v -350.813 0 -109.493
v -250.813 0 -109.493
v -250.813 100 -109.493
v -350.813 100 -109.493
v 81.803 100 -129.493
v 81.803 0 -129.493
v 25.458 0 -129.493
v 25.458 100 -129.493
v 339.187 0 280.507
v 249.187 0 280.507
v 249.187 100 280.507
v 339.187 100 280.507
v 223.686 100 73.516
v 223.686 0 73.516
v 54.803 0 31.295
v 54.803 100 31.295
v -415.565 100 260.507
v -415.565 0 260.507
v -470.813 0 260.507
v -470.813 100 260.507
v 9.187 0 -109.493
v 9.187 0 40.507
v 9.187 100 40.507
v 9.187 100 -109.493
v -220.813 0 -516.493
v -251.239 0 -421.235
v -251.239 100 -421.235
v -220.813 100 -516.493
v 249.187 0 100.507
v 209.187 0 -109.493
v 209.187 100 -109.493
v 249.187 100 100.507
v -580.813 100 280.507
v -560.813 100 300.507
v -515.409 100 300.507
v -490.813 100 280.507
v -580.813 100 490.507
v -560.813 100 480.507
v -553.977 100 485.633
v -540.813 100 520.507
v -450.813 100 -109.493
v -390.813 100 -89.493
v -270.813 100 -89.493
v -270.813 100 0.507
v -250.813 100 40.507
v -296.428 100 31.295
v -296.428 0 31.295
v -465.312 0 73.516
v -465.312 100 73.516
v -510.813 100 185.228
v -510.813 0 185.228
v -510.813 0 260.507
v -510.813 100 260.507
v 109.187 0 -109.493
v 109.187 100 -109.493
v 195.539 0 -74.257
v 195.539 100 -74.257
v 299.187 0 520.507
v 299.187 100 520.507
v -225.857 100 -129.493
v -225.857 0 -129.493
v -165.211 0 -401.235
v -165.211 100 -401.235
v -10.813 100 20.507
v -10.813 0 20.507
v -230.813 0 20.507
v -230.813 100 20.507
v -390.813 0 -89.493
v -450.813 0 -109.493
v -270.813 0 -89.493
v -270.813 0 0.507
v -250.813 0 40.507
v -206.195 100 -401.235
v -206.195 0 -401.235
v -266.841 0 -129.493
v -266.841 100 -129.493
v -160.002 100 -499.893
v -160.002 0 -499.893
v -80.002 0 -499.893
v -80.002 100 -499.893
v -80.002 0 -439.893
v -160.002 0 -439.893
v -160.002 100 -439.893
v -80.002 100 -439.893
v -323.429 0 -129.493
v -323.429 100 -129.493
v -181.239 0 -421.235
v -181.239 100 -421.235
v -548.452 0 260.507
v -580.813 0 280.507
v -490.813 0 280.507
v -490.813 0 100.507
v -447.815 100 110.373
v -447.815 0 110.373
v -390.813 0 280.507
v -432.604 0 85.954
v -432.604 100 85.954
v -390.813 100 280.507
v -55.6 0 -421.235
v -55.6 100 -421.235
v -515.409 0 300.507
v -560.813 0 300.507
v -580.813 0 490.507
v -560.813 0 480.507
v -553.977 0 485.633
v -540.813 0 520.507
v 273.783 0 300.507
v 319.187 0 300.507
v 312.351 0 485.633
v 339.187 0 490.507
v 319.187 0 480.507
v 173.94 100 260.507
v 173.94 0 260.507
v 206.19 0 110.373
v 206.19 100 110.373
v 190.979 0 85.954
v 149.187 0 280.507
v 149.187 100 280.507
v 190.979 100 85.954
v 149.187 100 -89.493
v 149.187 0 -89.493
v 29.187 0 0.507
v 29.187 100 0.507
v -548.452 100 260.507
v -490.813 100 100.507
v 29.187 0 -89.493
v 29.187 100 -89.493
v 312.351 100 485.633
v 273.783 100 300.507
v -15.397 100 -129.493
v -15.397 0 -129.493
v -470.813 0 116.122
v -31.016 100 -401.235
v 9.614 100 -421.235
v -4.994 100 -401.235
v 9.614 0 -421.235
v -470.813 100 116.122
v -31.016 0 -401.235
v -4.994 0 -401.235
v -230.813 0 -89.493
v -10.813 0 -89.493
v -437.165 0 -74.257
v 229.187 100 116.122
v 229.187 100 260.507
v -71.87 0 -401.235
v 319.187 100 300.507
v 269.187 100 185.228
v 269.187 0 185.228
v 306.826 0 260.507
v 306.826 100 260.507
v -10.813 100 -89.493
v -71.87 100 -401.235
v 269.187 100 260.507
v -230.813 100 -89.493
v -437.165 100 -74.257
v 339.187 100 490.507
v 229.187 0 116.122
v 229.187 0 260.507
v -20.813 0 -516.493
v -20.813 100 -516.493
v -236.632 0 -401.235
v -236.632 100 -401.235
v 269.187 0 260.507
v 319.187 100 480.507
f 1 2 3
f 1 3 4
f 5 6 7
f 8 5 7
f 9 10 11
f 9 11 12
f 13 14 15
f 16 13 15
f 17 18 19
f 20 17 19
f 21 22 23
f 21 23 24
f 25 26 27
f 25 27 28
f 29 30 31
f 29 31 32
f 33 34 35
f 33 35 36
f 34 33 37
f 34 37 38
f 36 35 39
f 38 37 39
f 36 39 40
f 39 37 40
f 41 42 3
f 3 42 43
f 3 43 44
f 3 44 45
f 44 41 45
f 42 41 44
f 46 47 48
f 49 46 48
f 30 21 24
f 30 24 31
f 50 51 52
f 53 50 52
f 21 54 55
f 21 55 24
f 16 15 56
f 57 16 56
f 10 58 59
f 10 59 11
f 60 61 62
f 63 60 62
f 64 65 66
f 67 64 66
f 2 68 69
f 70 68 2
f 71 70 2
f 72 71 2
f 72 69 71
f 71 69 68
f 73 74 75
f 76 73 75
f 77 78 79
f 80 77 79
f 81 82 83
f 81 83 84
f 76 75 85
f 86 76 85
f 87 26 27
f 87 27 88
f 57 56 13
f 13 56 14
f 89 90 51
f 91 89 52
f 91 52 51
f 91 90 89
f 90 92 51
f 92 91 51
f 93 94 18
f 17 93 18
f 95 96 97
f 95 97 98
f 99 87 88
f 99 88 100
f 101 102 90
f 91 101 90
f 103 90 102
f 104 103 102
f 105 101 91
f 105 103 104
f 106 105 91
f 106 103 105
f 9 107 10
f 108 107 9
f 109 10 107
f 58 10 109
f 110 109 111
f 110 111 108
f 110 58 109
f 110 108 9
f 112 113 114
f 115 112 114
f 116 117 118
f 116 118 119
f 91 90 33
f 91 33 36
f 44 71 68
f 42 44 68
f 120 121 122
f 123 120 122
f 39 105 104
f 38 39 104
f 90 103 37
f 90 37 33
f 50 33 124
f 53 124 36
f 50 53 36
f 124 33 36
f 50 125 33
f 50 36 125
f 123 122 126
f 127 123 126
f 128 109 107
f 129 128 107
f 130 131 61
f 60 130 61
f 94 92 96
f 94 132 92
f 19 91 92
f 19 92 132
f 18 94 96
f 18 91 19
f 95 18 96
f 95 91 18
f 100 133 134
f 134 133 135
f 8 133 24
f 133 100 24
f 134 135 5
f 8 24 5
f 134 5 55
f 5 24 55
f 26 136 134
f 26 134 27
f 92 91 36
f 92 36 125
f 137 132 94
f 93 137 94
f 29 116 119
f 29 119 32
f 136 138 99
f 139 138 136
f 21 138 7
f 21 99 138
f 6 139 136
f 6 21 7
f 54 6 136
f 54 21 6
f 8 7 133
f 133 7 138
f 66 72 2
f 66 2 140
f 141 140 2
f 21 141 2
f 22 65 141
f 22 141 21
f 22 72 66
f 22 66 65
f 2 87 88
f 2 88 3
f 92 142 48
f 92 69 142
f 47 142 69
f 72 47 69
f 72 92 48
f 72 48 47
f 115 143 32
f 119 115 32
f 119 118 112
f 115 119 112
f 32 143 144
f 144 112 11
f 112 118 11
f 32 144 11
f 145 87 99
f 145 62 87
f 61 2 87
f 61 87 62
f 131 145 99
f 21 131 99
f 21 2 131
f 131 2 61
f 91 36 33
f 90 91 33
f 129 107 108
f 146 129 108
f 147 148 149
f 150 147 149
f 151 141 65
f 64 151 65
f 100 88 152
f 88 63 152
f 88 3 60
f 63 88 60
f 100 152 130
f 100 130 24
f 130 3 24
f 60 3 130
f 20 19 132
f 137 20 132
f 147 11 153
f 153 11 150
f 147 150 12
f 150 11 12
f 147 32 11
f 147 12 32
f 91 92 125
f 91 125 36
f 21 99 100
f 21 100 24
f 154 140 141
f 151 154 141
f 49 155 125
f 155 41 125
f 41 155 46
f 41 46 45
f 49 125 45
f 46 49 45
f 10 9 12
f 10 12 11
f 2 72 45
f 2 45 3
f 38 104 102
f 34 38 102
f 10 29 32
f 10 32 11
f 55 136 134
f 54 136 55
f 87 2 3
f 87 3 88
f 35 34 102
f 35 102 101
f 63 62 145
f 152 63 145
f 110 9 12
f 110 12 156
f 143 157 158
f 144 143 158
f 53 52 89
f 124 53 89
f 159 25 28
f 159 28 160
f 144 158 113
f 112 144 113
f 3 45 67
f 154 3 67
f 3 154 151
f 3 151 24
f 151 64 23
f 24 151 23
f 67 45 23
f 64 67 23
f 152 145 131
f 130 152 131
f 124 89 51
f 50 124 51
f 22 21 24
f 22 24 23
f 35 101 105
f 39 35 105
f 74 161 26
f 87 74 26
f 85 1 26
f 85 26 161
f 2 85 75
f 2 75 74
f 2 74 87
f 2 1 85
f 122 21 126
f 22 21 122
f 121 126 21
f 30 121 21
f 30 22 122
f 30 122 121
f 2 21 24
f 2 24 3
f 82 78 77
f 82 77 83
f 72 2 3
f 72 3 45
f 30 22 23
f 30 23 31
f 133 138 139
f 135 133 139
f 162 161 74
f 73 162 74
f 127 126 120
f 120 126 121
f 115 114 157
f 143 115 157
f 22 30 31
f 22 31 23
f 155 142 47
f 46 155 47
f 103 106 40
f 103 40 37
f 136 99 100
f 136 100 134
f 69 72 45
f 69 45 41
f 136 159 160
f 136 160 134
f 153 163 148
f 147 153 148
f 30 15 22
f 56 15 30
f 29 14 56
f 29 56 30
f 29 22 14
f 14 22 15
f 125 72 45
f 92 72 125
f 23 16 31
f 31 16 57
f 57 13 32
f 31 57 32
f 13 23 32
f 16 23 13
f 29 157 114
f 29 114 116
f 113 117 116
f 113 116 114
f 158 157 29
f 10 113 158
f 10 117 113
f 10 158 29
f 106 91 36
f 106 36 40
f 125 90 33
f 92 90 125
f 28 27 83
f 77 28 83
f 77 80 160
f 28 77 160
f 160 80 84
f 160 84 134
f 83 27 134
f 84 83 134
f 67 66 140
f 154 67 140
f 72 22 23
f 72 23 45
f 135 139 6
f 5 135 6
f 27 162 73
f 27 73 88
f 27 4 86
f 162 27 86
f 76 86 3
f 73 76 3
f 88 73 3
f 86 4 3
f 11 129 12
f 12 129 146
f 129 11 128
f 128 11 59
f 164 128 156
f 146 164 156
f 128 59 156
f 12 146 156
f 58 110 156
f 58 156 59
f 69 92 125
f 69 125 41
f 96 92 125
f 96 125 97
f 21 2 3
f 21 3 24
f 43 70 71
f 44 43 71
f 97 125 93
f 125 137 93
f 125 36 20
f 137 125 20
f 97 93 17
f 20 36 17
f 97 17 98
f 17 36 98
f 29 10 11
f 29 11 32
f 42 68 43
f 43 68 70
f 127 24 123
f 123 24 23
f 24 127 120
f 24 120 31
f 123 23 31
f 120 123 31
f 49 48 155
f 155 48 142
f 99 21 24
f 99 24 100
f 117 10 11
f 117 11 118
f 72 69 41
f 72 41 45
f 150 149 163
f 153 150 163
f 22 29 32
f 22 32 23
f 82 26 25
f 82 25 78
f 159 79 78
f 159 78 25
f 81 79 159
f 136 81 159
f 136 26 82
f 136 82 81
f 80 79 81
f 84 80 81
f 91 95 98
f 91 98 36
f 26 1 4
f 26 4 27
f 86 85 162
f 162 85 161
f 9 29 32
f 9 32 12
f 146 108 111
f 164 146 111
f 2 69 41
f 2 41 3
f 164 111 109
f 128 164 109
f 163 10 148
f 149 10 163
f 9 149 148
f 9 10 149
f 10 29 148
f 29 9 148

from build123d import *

# Parameters (mm, degrees)
F2_DEPTH = 100
F3_T     = -20
F3_2_T   = -20
F3_3_T   = -20
F3_4_T   = -20
F3_5_T   = -20
F3_6_T   = -20
F4_DEPTH = 100
F5_T     = -20
F5_2_T   = -20
F5_3_T   = -20
F5_4_T   = -20
F5_5_T   = -20
F5_6_T   = -20
F1_W     = 80
F1_H     = 60
F6_DEPTH = 100
F7_DEPTH = 100
F8_T     = -20
F8_2_T   = -20


with BuildPart() as f2:
    # F1 (on Front) → F2 (new body)
    with BuildSketch(Plane.XZ):
        Polygon((-580.8128714561, 490.5066199303), (-580.8128714561, 280.5066199303), (-490.8128714561, 280.5066199303), (-540.8128714561, 520.5066199303), align=None)
    extrude(amount=-F2_DEPTH)

    # F3
    f3_openings = [f2.faces().sort_by_distance(p)[0] for p in [
        (-545.879538, 100, 380.10662),
        (-545.879538, 0, 380.10662),
    ]]
    offset(amount=F3_T, openings=f3_openings)


with BuildPart() as f2b:
    # F1 (on Front) → F2, piece 2 (new body)
    with BuildSketch(Plane.XZ):
        Polygon((-490.8128714561, 280.5066199303), (-490.8128714561, 100.5066199303), (-432.6043214474, 85.9544824281), (-390.8128714561, 280.5066199303), align=None)
    extrude(amount=-F2_DEPTH)

    # F3#2
    f3_2_openings = [f2b.faces().sort_by_distance(p)[0] for p in [
        (-449.744553, 100, 194.653752),
        (-449.744553, 0, 194.653752),
    ]]
    offset(amount=F3_2_T, openings=f3_2_openings)


with BuildPart() as f2c:
    # F1 (on Front) → F2, piece 3 (new body)
    with BuildSketch(Plane.XZ):
        Polygon((-450.8128714561, -109.4933800697), (-350.8128714561, -109.4933800697), (-250.8128714561, -109.4933800697), (-250.8128714561, 40.5066199303), align=None)
    extrude(amount=-F2_DEPTH)

    # F3#3
    f3_3_openings = [f2c.faces().sort_by_distance(p)[0] for p in [
        (-317.479538, 0, -59.49338),
        (-317.479538, 100, -59.49338),
    ]]
    offset(amount=F3_3_T, openings=f3_3_openings)


with BuildPart() as f2d:
    # F1 (on Front) → F2, piece 4 (new body)
    with BuildSketch(Plane.XZ):
        Polygon((9.1871285439, 40.5066199303), (209.1871285439, -109.4933800697), (249.1871285439, 100.5066199303), (190.9785785351, 85.9544824281), align=None)
    extrude(amount=-F2_DEPTH)

    # F3#5
    f3_5_openings = [f2d.faces().sort_by_distance(p)[0] for p in [
        (155.853795, 100, 10.50662),
        (155.853795, 0, 10.50662),
    ]]
    offset(amount=F3_5_T, openings=f3_5_openings)


with BuildPart() as f2e:
    # F1 (on Front) → F2, piece 5 (new body)
    with BuildSketch(Plane.XZ):
        Polygon((249.1871285439, 280.5066199303), (249.1871285439, 100.5066199303), (339.1871285439, 280.5066199303), align=None)
    extrude(amount=-F2_DEPTH)

    # F3#6
    f3_6_openings = [f2e.faces().sort_by_distance(p)[0] for p in [
        (279.187129, 100, 220.50662),
        (279.187129, 0, 220.50662),
    ]]
    offset(amount=F3_6_T, openings=f3_6_openings)


with BuildPart() as f2f:
    # F1 (on Front) → F2, piece 6 (new body)
    with BuildSketch(Plane.XZ):
        Polygon((-250.8128714561, -109.4933800697), (-181.2394853326, -421.2346735489), (-120.8128714561, -421.2346735489), (-55.5995645179, -421.2346735489), (9.1871285439, -109.4933800697), (-120.8128714561, -109.4933800697), (-237.8204911947, -109.4933800697), align=None)
    extrude(amount=-F2_DEPTH)

    # F3#4
    f3_4_openings = [f2f.faces().sort_by_distance(p)[0] for p in [
        (-119.755175, 100, -247.261827),
        (-119.755175, 0, -247.261827),
    ]]
    offset(amount=F3_4_T, openings=f3_4_openings)


with BuildPart() as f4:
    # F1 (on Front) → F4 (new body)
    with BuildSketch(Plane.XZ):
        Polygon((-580.8128714561, 280.5066199303), (-490.8128714561, 100.5066199303), (-490.8128714561, 280.5066199303), align=None)
    extrude(amount=-F4_DEPTH)

    # F5#6
    f5_6_openings = [f4.faces().sort_by_distance(p)[0] for p in [
        (-520.812871, 100, 220.50662),
        (-520.812871, 0, 220.50662),
    ]]
    offset(amount=F5_6_T, openings=f5_6_openings)


with BuildPart() as f4b:
    # F1 (on Front) → F4, piece 2 (new body)
    with BuildSketch(Plane.XZ):
        Polygon((-490.8128714561, 100.5066199303), (-450.8128714561, -109.4933800697), (-250.8128714561, 40.5066199303), (-432.6043214474, 85.9544824281), align=None)
    extrude(amount=-F4_DEPTH)

    # F5#5
    f5_5_openings = [f4b.faces().sort_by_distance(p)[0] for p in [
        (-397.479538, 100, 10.50662),
        (-397.479538, 0, 10.50662),
    ]]
    offset(amount=F5_5_T, openings=f5_5_openings)


with BuildPart() as f4c:
    # F1 (on Front) → F4, piece 3 (new body)
    with BuildSketch(Plane.XZ):
        Polygon((9.1871285439, -109.4933800697), (109.1871285439, -109.4933800697), (209.1871285439, -109.4933800697), (9.1871285439, 40.5066199303), align=None)
    extrude(amount=-F4_DEPTH)

    # F5#3
    f5_3_openings = [f4c.faces().sort_by_distance(p)[0] for p in [
        (75.853795, 100, -59.49338),
        (75.853795, 0, -59.49338),
    ]]
    offset(amount=F5_3_T, openings=f5_3_openings)


with BuildPart() as f4d:
    # F1 (on Front) → F4, piece 4 (new body)
    with BuildSketch(Plane.XZ):
        Polygon((190.9785785351, 85.9544824281), (249.1871285439, 100.5066199303), (249.1871285439, 280.5066199303), (149.1871285439, 280.5066199303), align=None)
    extrude(amount=-F4_DEPTH)

    # F5#2
    f5_2_openings = [f4d.faces().sort_by_distance(p)[0] for p in [
        (208.11881, 100, 194.653752),
        (208.11881, 0, 194.653752),
    ]]
    offset(amount=F5_2_T, openings=f5_2_openings)


with BuildPart() as f4e:
    # F1 (on Front) → F4, piece 5 (new body)
    with BuildSketch(Plane.XZ):
        Polygon((249.1871285439, 280.5066199303), (339.1871285439, 280.5066199303), (339.1871285439, 490.5066199303), (299.1871285439, 520.5066199303), align=None)
    extrude(amount=-F4_DEPTH)

    # F5
    f5_openings = [f4e.faces().sort_by_distance(p)[0] for p in [
        (304.253795, 100, 380.10662),
        (304.253795, 0, 380.10662),
    ]]
    offset(amount=F5_T, openings=f5_openings)


with BuildPart() as f4f:
    # F1 (on Front) → F4, piece 6 (new body)
    with BuildSketch(Plane.XZ):
        Polygon((-350.8128714561, -109.4933800697), (-251.2394853326, -421.2346735489), (-181.2394853326, -421.2346735489), (-250.8128714561, -109.4933800697), align=None)
    extrude(amount=-F4_DEPTH)

    # F5#4
    f5_4_openings = [f4f.faces().sort_by_distance(p)[0] for p in [
        (-261.013631, 100, -256.195165),
        (-261.013631, 0, -256.195165),
    ]]
    offset(amount=F5_4_T, openings=f5_4_openings)


with BuildPart() as f6:
    # F1 (on Front) → F6 (new body)
    with BuildSketch(Plane.XZ):
        Polygon((-251.2394853326, -421.2346735489), (-220.8128714561, -516.4933800697), (-120.8128714561, -516.4933800697), (-20.8128714561, -516.4933800697), (9.6137424203, -421.2346735489), (-55.5995645179, -421.2346735489), (-120.8128714561, -421.2346735489), (-181.2394853326, -421.2346735489), align=None)
        with Locations((-120.0018757582, -469.8925626278)):
            Rectangle(F1_W, F1_H, mode=Mode.SUBTRACT)
    extrude(amount=-F6_DEPTH)


with BuildPart() as f6b:
    # F1 (on Front) → F6, piece 2 (new body)
    with BuildSketch(Plane.XZ):
        Polygon((-250.8128714561, 40.5066199303), (-250.8128714561, -109.4933800697), (-237.8204911947, -109.4933800697), (-120.8128714561, -109.4933800697), (9.1871285439, -109.4933800697), (9.1871285439, 40.5066199303), (-120.8128714561, 40.5066199303), align=None)
    extrude(amount=-F6_DEPTH)

    # F8#2
    f8_2_openings = [f6b.faces().sort_by_distance(p)[0] for p in [
        (-120.812871, 0, -34.49338),
        (-120.812871, 100, -34.49338),
    ]]
    offset(amount=F8_2_T, openings=f8_2_openings)


with BuildPart() as f7:
    # F1 (on Front) → F7 (new body)
    with BuildSketch(Plane.XZ):
        Polygon((-55.5995645179, -421.2346735489), (9.6137424203, -421.2346735489), (109.1871285439, -109.4933800697), (9.1871285439, -109.4933800697), align=None)
    extrude(amount=-F7_DEPTH)

    # F8
    f8_openings = [f7.faces().sort_by_distance(p)[0] for p in [
        (20.981029, 100, -254.424181),
        (20.981029, 0, -254.424181),
    ]]
    offset(amount=F8_T, openings=f8_openings)


solid = Compound([f2.part, f2b.part, f2c.part, f2d.part, f2e.part, f2f.part, f4.part, f4b.part, f4c.part, f4d.part, f4e.part, f4f.part, f6.part, f6b.part, f7.part])
